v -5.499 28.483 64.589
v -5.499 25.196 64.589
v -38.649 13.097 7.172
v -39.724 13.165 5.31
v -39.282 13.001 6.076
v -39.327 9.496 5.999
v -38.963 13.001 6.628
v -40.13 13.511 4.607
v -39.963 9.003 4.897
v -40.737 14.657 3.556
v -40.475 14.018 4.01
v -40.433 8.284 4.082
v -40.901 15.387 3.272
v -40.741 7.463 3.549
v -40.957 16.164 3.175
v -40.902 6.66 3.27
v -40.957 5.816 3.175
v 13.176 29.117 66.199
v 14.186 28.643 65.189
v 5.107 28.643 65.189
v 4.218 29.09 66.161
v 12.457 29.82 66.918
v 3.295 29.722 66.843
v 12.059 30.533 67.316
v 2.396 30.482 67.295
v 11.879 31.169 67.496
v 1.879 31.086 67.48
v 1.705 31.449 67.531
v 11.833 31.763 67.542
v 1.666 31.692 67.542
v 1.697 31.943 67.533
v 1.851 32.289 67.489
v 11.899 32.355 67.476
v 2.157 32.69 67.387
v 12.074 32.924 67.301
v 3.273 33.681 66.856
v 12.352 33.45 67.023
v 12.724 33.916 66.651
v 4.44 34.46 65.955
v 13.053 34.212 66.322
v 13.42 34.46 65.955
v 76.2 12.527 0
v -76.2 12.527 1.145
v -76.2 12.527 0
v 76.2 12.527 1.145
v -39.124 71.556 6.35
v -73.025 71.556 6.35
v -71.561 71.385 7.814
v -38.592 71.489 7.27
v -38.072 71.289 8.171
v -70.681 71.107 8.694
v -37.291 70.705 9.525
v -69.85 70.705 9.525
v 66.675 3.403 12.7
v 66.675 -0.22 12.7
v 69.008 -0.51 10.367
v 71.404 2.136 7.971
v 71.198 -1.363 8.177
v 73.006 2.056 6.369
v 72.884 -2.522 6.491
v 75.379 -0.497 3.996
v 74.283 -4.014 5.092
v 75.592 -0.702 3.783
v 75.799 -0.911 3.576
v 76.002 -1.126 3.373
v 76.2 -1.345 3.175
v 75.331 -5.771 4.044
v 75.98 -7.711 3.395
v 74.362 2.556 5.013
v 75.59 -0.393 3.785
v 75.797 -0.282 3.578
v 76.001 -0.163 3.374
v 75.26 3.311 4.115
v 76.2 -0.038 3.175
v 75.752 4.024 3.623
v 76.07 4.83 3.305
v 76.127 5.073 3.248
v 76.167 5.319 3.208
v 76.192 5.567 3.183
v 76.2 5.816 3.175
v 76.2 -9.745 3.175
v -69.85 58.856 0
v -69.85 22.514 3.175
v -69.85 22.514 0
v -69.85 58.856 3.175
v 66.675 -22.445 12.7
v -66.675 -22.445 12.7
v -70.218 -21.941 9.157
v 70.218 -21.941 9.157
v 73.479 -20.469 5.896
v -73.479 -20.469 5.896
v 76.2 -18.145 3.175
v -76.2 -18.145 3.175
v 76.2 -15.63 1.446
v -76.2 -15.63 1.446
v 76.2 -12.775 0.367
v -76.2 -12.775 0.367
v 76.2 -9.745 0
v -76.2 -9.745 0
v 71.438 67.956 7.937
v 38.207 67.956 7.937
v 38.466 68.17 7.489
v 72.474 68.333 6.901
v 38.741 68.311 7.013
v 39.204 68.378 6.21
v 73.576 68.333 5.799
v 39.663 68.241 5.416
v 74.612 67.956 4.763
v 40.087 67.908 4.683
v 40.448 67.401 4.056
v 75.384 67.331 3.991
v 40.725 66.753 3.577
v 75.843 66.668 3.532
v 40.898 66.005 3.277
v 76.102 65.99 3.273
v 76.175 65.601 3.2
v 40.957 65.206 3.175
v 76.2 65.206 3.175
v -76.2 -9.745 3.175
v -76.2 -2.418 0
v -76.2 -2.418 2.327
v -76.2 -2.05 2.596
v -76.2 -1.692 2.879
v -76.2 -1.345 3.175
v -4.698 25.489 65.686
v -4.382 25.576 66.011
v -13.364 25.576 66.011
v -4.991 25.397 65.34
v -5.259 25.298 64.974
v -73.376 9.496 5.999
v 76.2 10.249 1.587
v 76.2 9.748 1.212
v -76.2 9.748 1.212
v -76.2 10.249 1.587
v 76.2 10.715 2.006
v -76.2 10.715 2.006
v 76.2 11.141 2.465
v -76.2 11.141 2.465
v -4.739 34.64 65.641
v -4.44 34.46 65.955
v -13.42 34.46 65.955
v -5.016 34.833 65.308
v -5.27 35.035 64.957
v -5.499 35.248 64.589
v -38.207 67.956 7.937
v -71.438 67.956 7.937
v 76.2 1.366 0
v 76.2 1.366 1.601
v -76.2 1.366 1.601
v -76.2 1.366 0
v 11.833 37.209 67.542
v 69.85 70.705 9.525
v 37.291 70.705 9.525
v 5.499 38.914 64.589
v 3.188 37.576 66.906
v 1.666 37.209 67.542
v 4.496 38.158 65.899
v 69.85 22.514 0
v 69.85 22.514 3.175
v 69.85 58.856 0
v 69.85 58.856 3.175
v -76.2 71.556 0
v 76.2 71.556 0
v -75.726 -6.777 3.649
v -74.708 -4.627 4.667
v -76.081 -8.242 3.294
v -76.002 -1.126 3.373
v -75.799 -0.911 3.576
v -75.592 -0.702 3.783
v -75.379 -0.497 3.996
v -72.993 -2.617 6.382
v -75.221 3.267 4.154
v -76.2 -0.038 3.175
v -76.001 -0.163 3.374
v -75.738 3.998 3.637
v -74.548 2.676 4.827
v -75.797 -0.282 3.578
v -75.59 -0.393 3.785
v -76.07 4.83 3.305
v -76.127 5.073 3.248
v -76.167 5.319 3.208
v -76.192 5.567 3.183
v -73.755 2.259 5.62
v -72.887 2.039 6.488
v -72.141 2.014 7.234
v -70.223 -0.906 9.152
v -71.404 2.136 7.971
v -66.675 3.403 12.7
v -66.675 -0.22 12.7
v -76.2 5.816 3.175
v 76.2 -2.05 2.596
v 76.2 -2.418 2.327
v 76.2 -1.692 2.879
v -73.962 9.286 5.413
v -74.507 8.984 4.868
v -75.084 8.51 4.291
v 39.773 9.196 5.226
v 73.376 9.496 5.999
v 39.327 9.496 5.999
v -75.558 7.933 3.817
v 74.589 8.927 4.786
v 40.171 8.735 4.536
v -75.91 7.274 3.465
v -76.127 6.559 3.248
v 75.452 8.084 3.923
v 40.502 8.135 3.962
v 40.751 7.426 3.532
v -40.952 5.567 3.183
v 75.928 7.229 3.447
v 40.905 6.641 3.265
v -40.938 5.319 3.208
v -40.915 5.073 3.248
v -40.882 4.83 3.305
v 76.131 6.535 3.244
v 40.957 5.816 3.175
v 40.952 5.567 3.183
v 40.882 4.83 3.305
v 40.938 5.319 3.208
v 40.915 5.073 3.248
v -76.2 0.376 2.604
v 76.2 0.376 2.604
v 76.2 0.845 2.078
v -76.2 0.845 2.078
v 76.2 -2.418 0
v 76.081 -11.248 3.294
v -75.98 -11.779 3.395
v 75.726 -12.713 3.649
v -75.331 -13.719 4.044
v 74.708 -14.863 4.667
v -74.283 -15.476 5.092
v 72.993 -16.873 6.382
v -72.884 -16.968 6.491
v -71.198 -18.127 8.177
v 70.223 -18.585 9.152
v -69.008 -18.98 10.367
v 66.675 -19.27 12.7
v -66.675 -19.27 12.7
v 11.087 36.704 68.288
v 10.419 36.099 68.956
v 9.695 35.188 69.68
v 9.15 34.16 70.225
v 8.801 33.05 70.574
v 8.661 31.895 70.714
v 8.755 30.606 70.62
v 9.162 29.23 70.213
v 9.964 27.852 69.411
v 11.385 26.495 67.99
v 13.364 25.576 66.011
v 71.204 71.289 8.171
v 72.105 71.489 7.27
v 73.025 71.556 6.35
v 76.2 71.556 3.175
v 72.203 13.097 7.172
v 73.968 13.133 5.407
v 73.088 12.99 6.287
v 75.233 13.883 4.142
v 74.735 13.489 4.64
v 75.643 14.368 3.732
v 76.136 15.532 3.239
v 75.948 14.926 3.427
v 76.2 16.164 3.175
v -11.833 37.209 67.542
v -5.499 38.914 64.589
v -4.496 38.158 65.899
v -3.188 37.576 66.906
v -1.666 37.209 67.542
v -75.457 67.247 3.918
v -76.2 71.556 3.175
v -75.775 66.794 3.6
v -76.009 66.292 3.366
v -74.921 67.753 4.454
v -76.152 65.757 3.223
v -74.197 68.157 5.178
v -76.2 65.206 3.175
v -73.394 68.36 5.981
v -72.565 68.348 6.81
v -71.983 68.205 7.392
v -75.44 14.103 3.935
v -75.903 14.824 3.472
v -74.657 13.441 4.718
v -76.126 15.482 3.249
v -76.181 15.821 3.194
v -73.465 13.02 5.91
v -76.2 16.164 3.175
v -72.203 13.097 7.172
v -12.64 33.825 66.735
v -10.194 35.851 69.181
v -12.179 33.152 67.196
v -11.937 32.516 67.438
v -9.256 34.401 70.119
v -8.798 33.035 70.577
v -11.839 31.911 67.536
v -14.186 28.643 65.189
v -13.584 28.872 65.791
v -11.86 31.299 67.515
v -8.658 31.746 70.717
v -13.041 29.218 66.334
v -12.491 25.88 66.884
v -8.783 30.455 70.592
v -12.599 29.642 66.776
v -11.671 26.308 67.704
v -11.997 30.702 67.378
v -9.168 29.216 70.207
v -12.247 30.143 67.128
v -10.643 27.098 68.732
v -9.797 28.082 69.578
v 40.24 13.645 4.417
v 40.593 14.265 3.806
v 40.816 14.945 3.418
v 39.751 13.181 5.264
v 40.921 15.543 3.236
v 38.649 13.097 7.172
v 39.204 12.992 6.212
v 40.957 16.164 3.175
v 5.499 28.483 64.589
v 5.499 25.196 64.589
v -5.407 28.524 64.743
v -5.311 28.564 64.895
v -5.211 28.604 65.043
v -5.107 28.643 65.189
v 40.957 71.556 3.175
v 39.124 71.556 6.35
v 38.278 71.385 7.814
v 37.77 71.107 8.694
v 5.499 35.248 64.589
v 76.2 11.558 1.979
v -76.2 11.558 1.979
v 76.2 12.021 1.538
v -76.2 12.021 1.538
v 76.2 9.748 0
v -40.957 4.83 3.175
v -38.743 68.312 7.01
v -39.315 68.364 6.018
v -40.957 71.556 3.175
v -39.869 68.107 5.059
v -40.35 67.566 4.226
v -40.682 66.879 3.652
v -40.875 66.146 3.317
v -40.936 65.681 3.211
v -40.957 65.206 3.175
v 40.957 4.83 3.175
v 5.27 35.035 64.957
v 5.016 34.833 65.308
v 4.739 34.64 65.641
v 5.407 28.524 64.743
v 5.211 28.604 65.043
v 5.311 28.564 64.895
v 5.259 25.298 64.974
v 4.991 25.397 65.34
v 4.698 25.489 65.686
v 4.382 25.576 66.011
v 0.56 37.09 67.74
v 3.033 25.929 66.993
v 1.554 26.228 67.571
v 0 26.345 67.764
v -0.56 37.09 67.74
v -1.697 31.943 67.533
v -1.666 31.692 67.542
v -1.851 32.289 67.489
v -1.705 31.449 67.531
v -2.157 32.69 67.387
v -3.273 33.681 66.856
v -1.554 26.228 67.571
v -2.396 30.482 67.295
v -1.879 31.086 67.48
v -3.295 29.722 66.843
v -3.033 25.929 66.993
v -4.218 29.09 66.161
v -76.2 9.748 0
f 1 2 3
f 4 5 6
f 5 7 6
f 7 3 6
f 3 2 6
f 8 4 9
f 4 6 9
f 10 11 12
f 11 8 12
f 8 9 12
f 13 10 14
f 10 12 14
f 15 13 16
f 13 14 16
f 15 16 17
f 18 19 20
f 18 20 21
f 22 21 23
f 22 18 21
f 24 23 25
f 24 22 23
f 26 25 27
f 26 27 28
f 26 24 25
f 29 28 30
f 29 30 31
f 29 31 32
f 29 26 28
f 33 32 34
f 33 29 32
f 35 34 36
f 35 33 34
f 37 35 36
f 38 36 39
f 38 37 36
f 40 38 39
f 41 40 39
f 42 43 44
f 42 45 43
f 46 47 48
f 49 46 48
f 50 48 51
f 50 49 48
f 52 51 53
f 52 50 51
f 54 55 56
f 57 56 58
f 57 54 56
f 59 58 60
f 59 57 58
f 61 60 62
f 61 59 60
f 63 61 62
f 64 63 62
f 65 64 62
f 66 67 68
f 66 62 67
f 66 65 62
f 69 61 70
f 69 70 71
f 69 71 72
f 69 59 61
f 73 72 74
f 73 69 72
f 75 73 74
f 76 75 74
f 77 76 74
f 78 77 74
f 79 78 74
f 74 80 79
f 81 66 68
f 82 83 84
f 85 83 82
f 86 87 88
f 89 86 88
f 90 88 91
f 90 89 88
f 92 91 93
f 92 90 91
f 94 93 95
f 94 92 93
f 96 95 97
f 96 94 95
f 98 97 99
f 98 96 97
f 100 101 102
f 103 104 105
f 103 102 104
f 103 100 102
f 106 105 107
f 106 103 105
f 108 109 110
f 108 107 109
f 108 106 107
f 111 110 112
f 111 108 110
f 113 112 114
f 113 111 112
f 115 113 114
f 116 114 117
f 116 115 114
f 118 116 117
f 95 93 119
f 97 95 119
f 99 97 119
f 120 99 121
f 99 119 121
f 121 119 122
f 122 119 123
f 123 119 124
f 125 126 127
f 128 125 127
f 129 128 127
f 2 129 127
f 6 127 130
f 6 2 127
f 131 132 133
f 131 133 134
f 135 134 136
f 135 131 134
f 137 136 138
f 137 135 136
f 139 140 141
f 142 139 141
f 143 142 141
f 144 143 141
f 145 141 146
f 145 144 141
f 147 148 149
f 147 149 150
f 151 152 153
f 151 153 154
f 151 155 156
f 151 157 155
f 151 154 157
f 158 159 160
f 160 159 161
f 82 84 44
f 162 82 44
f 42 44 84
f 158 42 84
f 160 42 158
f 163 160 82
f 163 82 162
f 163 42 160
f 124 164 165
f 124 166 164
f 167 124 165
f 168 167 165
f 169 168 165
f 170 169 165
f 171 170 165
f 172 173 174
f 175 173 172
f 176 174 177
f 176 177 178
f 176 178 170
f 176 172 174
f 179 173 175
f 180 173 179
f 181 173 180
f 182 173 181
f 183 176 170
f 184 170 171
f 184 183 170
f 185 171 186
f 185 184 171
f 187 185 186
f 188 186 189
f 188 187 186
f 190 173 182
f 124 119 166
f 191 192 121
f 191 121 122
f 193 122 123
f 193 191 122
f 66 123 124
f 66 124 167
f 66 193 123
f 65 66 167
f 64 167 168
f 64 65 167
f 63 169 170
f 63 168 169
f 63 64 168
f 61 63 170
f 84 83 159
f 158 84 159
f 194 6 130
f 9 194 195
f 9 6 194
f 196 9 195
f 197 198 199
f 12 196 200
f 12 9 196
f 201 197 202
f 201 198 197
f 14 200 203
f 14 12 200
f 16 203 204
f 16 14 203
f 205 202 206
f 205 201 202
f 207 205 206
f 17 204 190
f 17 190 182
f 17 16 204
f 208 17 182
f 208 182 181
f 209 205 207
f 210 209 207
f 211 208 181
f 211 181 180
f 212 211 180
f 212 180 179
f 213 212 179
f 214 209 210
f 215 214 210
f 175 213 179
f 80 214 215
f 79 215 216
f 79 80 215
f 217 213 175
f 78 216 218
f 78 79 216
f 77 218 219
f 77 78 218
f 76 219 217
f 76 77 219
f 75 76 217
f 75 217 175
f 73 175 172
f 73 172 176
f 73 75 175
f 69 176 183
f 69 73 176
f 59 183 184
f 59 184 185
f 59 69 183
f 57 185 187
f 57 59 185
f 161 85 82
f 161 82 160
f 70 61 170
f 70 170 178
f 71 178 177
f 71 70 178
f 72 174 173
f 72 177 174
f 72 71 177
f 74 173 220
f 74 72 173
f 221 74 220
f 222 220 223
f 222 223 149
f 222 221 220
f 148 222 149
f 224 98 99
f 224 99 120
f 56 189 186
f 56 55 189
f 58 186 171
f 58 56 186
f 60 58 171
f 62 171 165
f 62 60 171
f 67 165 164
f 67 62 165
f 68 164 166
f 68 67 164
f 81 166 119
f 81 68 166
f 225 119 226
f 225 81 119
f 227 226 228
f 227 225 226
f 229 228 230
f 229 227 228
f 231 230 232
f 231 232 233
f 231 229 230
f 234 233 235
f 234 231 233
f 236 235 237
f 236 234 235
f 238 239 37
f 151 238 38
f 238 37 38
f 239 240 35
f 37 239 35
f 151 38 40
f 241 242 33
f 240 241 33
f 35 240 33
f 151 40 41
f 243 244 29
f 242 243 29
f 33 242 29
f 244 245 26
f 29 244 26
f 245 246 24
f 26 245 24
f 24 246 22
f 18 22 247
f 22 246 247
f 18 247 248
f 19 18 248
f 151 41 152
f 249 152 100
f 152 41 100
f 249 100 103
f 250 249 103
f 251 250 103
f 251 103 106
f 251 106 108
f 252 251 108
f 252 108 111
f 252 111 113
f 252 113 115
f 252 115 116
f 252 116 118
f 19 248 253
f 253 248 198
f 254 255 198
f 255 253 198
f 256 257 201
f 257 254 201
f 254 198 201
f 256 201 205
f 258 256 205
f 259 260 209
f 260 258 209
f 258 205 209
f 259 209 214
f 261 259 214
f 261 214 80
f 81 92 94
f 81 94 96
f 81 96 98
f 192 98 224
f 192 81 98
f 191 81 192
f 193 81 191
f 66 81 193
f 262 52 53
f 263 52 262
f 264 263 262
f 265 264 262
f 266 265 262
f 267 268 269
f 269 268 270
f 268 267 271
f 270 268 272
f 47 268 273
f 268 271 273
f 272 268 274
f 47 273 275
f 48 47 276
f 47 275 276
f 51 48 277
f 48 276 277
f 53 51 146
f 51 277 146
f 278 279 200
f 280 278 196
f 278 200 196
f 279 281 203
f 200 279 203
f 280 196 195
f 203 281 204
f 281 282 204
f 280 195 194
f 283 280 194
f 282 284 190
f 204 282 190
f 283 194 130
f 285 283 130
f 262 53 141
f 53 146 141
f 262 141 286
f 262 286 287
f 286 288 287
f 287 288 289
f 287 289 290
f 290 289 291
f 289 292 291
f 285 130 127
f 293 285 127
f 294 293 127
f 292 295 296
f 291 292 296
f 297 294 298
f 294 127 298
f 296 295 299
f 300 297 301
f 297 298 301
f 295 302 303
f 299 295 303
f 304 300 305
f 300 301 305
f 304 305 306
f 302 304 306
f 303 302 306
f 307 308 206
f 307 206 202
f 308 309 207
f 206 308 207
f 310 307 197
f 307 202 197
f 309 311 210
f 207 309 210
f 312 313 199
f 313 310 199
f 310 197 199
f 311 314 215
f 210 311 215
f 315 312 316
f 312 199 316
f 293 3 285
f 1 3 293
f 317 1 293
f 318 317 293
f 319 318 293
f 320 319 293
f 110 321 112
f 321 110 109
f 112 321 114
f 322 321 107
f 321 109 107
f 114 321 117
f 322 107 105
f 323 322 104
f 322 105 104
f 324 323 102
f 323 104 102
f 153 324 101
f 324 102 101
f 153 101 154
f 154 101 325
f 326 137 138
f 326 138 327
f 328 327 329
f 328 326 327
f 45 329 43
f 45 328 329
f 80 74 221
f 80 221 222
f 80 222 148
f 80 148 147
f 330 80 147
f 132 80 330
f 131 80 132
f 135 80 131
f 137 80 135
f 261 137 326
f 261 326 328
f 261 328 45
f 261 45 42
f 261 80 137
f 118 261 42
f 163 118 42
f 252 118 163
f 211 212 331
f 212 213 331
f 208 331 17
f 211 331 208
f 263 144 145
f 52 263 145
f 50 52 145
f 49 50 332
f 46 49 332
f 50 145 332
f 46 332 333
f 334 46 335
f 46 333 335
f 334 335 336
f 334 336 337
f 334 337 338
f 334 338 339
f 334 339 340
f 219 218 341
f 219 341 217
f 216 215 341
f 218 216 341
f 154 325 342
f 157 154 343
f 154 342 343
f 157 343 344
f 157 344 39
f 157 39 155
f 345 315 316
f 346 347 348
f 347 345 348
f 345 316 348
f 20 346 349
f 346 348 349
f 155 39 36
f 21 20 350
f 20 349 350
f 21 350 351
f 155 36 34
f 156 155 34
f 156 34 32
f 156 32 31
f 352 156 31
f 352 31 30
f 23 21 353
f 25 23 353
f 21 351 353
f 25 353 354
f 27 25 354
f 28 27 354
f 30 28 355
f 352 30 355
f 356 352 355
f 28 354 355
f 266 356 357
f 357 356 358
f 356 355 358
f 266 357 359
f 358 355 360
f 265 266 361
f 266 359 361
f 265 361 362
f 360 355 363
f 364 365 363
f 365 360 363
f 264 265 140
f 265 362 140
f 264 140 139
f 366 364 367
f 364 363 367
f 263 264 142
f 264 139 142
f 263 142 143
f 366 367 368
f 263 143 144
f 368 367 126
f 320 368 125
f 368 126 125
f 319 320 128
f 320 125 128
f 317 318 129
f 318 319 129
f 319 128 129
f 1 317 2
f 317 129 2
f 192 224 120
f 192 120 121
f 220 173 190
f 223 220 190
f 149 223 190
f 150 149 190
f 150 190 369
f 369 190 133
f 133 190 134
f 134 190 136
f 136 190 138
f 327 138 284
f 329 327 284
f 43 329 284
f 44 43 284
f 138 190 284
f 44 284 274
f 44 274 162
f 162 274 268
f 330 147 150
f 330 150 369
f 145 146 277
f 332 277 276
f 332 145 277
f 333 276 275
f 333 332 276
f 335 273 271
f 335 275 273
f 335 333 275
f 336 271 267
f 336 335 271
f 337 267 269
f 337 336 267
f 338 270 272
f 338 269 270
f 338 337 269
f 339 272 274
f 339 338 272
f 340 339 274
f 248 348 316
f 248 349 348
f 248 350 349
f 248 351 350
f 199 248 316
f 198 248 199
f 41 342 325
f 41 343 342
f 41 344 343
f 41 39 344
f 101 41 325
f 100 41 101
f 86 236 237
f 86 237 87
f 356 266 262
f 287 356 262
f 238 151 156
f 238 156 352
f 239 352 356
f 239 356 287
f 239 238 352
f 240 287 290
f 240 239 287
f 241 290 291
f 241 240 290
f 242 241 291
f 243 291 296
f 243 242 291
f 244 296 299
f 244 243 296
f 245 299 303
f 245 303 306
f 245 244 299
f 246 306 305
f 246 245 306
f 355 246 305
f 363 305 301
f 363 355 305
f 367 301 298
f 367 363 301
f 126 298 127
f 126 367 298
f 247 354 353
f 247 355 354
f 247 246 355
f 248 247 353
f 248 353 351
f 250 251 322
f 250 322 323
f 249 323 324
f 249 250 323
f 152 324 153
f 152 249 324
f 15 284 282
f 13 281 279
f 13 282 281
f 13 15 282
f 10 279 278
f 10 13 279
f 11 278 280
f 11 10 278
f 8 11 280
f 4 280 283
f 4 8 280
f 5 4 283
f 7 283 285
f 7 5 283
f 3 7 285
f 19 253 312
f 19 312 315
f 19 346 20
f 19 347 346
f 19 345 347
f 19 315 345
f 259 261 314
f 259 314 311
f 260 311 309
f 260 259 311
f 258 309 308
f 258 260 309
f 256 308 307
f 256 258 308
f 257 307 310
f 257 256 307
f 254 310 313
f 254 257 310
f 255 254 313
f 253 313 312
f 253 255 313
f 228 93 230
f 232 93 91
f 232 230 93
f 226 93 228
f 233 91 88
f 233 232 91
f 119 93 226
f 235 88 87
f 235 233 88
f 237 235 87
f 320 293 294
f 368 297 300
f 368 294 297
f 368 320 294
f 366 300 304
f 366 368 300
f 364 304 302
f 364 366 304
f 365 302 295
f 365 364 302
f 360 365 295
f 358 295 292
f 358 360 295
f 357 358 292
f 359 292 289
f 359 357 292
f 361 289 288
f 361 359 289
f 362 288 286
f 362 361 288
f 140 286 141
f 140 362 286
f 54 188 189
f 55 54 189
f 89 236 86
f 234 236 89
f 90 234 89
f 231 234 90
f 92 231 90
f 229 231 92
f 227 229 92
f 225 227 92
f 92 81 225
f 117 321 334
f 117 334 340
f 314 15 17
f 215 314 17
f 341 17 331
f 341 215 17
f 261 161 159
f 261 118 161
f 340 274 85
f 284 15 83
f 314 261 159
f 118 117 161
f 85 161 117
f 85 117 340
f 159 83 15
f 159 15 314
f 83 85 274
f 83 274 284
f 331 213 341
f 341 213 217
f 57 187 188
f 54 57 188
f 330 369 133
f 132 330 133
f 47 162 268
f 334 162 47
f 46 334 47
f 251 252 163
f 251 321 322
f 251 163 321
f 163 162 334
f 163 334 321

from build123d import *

# Parameters (mm, degrees)
F1_DEPTH      = 76.2
F2_W          = 139.7
F2_H          = 36.3417792003
F3_DEPTH      = 25.4
F7_DEPTH      = 27.275979542
F7_DEPTH_BACK = 66.7271380179
F9_DEPTH      = 66.7271380179


with BuildPart() as f1:
    # F0 (on Right) → F1 (new body, symmetric)
    with BuildSketch(Plane.YZ):
        with BuildLine():
            ThreePointArc((-0.2200527473, 12.7), (-9.7450527473, 3.175), (-19.2700527473, 12.7))
            Line((-19.2700527473, 12.7), (-22.4450527473, 12.7))
            ThreePointArc((-22.4450527473, 12.7), (-18.7253088684, 3.7197438789), (-9.7450527473, 0))
            Line((-9.7450527473, 0), (-2.4182328489, 0))
            Line((-2.4182328489, 0), (-2.4182328489, 2.3265863779))
            ThreePointArc((-2.4182328489, 2.3265863779), (-1.4157111092, 3.1129218281), (-0.4970236472, 3.9957505917))
            ThreePointArc((-0.4970236472, 3.9957505917), (0.3027257677, 2.6962087261), (1.3655856019, 1.6013401678))
            Line((1.3655856019, 1.6013401678), (1.3655856019, 0))
            Line((1.3655856019, 0), (9.7478376701, 0))
            Line((9.7478376701, 0), (9.7478376701, 1.2116913596))
            ThreePointArc((9.7478376701, 1.2116913596), (10.4868542157, 1.7913884), (11.1414158123, 2.4649930537))
            ThreePointArc((11.1414158123, 2.4649930537), (11.784015325, 1.75263856), (12.5265968964, 1.145221349))
            Line((12.5265968964, 1.145221349), (12.5265968964, 0))
            Line((12.5265968964, 0), (16.1642856123, 0))
            Line((16.1642856123, 0), (71.5560648125, 0))
            Line((71.5560648125, 0), (71.5560648125, 6.35))
            ThreePointArc((71.5560648125, 6.35), (71.3396938095, 7.9935009364), (70.7053261266, 9.525))
            Line((70.7053261266, 9.525), (37.2091680094, 67.5420477173))
            ThreePointArc((37.2091680094, 67.5420477173), (30.8810653748, 70.662722587), (25.5762776984, 66.0105486537))
            Line((25.5762776984, 66.0105486537), (9.4962047547, 5.9988994382))
            ThreePointArc((9.4962047547, 5.9988994382), (4.8299267947, 3.3048226018), (2.1358499583, 7.9711005618))
            Line((2.1358499583, 7.9711005618), (3.4029547439, 12.7))
            Line((3.4029547439, 12.7), (-0.2200527473, 12.7))
        make_face()
        with BuildLine():
            ThreePointArc((67.9556954695, 7.9375), (67.9556954695, 4.7625), (65.2060648125, 3.175))
            Line((65.2060648125, 3.175), (16.1642856123, 3.175))
            ThreePointArc((16.1642856123, 3.175), (13.6453887568, 4.4171824629), (13.0974711138, 7.1717504682))
            Line((13.0974711138, 7.1717504682), (28.6430921969, 65.1887981855))
            ThreePointArc((28.6430921969, 65.1887981855), (31.2954860351, 67.5148851522), (34.4595373524, 65.9545477173))
            Line((34.4595373524, 65.9545477173), (67.9556954695, 7.9375))
        make_face(mode=Mode.SUBTRACT)
    extrude(amount=F1_DEPTH, both=True)

    # F2 (on face) → F3 (cut)
    with BuildSketch(Plane.XY.offset(3.175)):
        with Locations((0, 40.6851752124)):
            Rectangle(F2_W, F2_H)
    extrude(amount=-F3_DEPTH, mode=Mode.SUBTRACT)

    # F6 (on plane+point) → F7 (cut, two sides)
    with BuildSketch(Plane.XZ.offset(-4.8299267947)) as f7_sk:
        Polygon((76.2, 73.3377320159), (6.0372679841, 73.3377320159), (76.2, 3.175), align=None)
        Polygon((-76.2, 3.175), (-6.0372679841, 73.3377320159), (-76.2, 73.3377320159), align=None)
    extrude(amount=F7_DEPTH, mode=Mode.SUBTRACT)
    extrude(f7_sk.sketch, amount=-F7_DEPTH_BACK, mode=Mode.SUBTRACT)

    # F8 (on plane+point) → F9 (cut, through all)
    with BuildSketch(Plane.XZ.offset(-4.8299267947)):
        with BuildLine():
            Line((-5.499261314, 64.5894877579), (-40.9569323532, 3.175))
            Line((-40.9569323532, 3.175), (40.9569323532, 3.175))
            Line((40.9569323532, 3.175), (5.499261314, 64.5894877579))
            ThreePointArc((5.499261314, 64.5894877579), (0, 67.7644877579), (-5.499261314, 64.5894877579))
        make_face()
    extrude(amount=-F9_DEPTH, mode=Mode.SUBTRACT)


solid = f1.part
